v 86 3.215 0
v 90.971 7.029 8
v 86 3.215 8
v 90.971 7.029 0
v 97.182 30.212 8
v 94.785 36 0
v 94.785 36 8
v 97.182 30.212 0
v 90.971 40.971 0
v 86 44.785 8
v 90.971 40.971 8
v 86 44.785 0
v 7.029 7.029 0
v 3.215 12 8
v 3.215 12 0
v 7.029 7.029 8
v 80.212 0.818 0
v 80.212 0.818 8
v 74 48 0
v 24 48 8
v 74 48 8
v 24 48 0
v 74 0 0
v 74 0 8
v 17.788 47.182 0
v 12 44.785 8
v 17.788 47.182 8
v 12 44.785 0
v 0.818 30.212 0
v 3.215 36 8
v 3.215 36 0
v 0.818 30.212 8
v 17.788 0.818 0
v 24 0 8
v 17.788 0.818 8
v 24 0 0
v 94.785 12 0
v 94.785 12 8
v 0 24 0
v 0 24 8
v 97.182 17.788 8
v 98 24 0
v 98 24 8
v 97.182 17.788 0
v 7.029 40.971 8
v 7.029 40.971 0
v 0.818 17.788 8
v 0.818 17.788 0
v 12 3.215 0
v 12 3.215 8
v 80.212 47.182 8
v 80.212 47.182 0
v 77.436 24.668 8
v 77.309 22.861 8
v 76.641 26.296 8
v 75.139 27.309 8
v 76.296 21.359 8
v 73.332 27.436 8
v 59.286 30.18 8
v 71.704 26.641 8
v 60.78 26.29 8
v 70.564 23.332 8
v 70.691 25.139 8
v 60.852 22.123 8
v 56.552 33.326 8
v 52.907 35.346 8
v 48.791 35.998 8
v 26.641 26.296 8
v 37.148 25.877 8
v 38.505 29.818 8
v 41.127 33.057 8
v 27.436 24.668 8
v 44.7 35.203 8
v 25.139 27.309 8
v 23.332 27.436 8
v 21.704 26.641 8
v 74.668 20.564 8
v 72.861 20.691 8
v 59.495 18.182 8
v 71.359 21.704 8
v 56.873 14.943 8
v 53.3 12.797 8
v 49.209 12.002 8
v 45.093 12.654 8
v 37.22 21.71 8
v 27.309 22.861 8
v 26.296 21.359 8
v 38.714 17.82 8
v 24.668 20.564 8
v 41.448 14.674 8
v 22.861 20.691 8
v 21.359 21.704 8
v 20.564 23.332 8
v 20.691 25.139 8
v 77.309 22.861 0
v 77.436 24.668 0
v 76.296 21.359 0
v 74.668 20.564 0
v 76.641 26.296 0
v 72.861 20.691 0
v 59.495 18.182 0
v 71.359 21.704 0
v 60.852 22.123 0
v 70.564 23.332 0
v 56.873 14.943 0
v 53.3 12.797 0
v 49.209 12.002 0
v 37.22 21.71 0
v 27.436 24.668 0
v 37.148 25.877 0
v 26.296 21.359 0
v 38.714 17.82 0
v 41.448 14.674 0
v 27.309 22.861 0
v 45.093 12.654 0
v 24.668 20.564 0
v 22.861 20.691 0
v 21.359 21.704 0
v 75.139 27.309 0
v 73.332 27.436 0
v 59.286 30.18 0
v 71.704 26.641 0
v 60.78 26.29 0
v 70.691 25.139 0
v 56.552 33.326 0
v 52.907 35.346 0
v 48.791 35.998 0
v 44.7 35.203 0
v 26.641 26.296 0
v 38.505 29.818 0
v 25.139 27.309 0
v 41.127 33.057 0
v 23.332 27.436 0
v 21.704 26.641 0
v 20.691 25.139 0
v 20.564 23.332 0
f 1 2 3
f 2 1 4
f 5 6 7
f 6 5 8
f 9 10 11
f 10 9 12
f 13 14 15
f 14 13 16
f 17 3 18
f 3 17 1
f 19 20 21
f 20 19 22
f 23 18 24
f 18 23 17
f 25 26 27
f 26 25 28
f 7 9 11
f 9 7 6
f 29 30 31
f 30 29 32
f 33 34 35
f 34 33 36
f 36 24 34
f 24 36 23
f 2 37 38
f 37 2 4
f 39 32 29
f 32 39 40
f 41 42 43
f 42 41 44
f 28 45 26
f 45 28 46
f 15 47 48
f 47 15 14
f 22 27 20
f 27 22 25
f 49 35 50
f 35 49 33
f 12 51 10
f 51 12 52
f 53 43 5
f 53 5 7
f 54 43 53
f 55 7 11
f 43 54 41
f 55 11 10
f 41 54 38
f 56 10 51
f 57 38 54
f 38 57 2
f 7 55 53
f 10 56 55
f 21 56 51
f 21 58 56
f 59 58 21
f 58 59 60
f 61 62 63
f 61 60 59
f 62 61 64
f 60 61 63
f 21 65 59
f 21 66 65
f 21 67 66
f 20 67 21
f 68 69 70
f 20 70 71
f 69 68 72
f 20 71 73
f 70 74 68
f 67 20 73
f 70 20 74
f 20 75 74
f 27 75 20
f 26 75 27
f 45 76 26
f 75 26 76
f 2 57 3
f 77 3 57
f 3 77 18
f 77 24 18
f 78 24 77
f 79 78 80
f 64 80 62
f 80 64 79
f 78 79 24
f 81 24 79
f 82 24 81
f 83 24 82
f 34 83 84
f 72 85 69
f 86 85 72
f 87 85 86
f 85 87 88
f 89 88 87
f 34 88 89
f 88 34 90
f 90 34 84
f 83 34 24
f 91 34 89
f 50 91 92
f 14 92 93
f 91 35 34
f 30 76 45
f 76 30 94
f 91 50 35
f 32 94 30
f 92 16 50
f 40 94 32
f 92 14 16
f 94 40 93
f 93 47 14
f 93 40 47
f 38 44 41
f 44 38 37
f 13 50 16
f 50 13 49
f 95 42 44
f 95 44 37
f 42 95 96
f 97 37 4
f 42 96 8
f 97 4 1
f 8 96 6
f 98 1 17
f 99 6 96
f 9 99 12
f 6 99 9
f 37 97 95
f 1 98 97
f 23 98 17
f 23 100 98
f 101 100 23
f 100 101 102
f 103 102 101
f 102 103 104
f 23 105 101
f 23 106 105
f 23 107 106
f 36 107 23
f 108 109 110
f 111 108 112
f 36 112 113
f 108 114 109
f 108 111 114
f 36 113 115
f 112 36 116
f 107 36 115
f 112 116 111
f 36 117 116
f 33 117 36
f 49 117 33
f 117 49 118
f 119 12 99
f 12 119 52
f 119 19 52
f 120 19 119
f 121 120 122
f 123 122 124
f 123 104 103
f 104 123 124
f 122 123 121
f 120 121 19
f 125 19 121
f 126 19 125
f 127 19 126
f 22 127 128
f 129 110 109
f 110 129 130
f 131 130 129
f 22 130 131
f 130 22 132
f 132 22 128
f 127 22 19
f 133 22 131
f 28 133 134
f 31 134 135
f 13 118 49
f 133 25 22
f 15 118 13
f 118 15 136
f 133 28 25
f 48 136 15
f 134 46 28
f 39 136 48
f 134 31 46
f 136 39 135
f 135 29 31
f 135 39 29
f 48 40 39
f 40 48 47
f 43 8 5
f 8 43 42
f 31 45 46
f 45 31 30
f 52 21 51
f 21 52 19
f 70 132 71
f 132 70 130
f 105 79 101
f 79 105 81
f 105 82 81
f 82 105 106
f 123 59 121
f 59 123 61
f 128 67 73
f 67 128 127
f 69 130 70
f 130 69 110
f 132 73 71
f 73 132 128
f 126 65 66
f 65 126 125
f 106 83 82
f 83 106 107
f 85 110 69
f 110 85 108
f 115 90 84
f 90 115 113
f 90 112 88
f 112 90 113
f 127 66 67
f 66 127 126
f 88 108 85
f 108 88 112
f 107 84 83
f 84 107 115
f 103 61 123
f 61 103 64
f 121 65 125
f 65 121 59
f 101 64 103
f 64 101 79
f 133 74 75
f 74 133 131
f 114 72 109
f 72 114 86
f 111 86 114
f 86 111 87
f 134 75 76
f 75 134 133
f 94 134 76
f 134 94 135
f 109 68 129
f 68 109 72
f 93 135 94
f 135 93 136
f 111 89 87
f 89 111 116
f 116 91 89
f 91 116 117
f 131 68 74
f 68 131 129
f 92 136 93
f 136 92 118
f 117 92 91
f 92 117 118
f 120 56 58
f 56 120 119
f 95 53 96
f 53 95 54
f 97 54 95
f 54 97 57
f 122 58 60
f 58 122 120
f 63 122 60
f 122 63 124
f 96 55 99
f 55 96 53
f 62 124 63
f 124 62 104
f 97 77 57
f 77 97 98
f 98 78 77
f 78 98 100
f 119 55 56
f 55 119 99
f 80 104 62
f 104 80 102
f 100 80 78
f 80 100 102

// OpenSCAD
$fn = 32;

// ----------------------------------------------------------------------
// Spacer plate: obround span 50, caps R24
// ----------------------------------------------------------------------

// --- parameters (mm) ---
bore_r = 12;              // centre bore radius
bolt_r = 3.5;             // bolt hole radius
plate_t = 8;              // plate thickness, Z (extrusion height)
span = 50;                // obround span
cap_r = 24;               // cap radius

profile = [[24, 48], [17.788, 47.182], [12, 44.785], [7.029, 40.971], [3.215, 36], [0.818, 30.212], [0, 24], [0.818, 17.788], [3.215, 12], [7.029, 7.029], [12, 3.215], [17.788, 0.818], [24, 0], [74, 0], [80.212, 0.818], [86, 3.215], [90.971, 7.029], [94.785, 12], [97.182, 17.788], [98, 24], [97.182, 30.212], [94.785, 36], [90.971, 40.971], [86, 44.785], [80.212, 47.182], [74, 48]];  // primary outline, 26 points, counter clockwise
void_1 = [[60.78, 26.29], [59.286, 30.18], [56.552, 33.326], [52.907, 35.346], [48.791, 35.998], [44.7, 35.203], [41.127, 33.057], [38.505, 29.818], [37.148, 25.877], [37.22, 21.71], [38.714, 17.82], [41.448, 14.674], [45.093, 12.654], [49.209, 12.002], [53.3, 12.797], [56.873, 14.943], [59.495, 18.182], [60.852, 22.123]];  // centre bore, 18 points
void_2 = [[27.436, 24.668], [26.641, 26.296], [25.139, 27.309], [23.332, 27.436], [21.704, 26.641], [20.691, 25.139], [20.564, 23.332], [21.359, 21.704], [22.861, 20.691], [24.668, 20.564], [26.296, 21.359], [27.309, 22.861]];  // end hole, 12 points
void_3 = [[77.436, 24.668], [76.641, 26.296], [75.139, 27.309], [73.332, 27.436], [71.704, 26.641], [70.691, 25.139], [70.564, 23.332], [71.359, 21.704], [72.861, 20.691], [74.668, 20.564], [76.296, 21.359], [77.309, 22.861]];  // end hole, 12 points

// --- the one profile operation ---
difference() {
  linear_extrude(height = plate_t) polygon(points = profile);
  translate([0, 0, -1])
    linear_extrude(height = plate_t + 2) polygon(points = void_1);
  translate([0, 0, -1])
    linear_extrude(height = plate_t + 2) polygon(points = void_2);
  translate([0, 0, -1])
    linear_extrude(height = plate_t + 2) polygon(points = void_3);
}
